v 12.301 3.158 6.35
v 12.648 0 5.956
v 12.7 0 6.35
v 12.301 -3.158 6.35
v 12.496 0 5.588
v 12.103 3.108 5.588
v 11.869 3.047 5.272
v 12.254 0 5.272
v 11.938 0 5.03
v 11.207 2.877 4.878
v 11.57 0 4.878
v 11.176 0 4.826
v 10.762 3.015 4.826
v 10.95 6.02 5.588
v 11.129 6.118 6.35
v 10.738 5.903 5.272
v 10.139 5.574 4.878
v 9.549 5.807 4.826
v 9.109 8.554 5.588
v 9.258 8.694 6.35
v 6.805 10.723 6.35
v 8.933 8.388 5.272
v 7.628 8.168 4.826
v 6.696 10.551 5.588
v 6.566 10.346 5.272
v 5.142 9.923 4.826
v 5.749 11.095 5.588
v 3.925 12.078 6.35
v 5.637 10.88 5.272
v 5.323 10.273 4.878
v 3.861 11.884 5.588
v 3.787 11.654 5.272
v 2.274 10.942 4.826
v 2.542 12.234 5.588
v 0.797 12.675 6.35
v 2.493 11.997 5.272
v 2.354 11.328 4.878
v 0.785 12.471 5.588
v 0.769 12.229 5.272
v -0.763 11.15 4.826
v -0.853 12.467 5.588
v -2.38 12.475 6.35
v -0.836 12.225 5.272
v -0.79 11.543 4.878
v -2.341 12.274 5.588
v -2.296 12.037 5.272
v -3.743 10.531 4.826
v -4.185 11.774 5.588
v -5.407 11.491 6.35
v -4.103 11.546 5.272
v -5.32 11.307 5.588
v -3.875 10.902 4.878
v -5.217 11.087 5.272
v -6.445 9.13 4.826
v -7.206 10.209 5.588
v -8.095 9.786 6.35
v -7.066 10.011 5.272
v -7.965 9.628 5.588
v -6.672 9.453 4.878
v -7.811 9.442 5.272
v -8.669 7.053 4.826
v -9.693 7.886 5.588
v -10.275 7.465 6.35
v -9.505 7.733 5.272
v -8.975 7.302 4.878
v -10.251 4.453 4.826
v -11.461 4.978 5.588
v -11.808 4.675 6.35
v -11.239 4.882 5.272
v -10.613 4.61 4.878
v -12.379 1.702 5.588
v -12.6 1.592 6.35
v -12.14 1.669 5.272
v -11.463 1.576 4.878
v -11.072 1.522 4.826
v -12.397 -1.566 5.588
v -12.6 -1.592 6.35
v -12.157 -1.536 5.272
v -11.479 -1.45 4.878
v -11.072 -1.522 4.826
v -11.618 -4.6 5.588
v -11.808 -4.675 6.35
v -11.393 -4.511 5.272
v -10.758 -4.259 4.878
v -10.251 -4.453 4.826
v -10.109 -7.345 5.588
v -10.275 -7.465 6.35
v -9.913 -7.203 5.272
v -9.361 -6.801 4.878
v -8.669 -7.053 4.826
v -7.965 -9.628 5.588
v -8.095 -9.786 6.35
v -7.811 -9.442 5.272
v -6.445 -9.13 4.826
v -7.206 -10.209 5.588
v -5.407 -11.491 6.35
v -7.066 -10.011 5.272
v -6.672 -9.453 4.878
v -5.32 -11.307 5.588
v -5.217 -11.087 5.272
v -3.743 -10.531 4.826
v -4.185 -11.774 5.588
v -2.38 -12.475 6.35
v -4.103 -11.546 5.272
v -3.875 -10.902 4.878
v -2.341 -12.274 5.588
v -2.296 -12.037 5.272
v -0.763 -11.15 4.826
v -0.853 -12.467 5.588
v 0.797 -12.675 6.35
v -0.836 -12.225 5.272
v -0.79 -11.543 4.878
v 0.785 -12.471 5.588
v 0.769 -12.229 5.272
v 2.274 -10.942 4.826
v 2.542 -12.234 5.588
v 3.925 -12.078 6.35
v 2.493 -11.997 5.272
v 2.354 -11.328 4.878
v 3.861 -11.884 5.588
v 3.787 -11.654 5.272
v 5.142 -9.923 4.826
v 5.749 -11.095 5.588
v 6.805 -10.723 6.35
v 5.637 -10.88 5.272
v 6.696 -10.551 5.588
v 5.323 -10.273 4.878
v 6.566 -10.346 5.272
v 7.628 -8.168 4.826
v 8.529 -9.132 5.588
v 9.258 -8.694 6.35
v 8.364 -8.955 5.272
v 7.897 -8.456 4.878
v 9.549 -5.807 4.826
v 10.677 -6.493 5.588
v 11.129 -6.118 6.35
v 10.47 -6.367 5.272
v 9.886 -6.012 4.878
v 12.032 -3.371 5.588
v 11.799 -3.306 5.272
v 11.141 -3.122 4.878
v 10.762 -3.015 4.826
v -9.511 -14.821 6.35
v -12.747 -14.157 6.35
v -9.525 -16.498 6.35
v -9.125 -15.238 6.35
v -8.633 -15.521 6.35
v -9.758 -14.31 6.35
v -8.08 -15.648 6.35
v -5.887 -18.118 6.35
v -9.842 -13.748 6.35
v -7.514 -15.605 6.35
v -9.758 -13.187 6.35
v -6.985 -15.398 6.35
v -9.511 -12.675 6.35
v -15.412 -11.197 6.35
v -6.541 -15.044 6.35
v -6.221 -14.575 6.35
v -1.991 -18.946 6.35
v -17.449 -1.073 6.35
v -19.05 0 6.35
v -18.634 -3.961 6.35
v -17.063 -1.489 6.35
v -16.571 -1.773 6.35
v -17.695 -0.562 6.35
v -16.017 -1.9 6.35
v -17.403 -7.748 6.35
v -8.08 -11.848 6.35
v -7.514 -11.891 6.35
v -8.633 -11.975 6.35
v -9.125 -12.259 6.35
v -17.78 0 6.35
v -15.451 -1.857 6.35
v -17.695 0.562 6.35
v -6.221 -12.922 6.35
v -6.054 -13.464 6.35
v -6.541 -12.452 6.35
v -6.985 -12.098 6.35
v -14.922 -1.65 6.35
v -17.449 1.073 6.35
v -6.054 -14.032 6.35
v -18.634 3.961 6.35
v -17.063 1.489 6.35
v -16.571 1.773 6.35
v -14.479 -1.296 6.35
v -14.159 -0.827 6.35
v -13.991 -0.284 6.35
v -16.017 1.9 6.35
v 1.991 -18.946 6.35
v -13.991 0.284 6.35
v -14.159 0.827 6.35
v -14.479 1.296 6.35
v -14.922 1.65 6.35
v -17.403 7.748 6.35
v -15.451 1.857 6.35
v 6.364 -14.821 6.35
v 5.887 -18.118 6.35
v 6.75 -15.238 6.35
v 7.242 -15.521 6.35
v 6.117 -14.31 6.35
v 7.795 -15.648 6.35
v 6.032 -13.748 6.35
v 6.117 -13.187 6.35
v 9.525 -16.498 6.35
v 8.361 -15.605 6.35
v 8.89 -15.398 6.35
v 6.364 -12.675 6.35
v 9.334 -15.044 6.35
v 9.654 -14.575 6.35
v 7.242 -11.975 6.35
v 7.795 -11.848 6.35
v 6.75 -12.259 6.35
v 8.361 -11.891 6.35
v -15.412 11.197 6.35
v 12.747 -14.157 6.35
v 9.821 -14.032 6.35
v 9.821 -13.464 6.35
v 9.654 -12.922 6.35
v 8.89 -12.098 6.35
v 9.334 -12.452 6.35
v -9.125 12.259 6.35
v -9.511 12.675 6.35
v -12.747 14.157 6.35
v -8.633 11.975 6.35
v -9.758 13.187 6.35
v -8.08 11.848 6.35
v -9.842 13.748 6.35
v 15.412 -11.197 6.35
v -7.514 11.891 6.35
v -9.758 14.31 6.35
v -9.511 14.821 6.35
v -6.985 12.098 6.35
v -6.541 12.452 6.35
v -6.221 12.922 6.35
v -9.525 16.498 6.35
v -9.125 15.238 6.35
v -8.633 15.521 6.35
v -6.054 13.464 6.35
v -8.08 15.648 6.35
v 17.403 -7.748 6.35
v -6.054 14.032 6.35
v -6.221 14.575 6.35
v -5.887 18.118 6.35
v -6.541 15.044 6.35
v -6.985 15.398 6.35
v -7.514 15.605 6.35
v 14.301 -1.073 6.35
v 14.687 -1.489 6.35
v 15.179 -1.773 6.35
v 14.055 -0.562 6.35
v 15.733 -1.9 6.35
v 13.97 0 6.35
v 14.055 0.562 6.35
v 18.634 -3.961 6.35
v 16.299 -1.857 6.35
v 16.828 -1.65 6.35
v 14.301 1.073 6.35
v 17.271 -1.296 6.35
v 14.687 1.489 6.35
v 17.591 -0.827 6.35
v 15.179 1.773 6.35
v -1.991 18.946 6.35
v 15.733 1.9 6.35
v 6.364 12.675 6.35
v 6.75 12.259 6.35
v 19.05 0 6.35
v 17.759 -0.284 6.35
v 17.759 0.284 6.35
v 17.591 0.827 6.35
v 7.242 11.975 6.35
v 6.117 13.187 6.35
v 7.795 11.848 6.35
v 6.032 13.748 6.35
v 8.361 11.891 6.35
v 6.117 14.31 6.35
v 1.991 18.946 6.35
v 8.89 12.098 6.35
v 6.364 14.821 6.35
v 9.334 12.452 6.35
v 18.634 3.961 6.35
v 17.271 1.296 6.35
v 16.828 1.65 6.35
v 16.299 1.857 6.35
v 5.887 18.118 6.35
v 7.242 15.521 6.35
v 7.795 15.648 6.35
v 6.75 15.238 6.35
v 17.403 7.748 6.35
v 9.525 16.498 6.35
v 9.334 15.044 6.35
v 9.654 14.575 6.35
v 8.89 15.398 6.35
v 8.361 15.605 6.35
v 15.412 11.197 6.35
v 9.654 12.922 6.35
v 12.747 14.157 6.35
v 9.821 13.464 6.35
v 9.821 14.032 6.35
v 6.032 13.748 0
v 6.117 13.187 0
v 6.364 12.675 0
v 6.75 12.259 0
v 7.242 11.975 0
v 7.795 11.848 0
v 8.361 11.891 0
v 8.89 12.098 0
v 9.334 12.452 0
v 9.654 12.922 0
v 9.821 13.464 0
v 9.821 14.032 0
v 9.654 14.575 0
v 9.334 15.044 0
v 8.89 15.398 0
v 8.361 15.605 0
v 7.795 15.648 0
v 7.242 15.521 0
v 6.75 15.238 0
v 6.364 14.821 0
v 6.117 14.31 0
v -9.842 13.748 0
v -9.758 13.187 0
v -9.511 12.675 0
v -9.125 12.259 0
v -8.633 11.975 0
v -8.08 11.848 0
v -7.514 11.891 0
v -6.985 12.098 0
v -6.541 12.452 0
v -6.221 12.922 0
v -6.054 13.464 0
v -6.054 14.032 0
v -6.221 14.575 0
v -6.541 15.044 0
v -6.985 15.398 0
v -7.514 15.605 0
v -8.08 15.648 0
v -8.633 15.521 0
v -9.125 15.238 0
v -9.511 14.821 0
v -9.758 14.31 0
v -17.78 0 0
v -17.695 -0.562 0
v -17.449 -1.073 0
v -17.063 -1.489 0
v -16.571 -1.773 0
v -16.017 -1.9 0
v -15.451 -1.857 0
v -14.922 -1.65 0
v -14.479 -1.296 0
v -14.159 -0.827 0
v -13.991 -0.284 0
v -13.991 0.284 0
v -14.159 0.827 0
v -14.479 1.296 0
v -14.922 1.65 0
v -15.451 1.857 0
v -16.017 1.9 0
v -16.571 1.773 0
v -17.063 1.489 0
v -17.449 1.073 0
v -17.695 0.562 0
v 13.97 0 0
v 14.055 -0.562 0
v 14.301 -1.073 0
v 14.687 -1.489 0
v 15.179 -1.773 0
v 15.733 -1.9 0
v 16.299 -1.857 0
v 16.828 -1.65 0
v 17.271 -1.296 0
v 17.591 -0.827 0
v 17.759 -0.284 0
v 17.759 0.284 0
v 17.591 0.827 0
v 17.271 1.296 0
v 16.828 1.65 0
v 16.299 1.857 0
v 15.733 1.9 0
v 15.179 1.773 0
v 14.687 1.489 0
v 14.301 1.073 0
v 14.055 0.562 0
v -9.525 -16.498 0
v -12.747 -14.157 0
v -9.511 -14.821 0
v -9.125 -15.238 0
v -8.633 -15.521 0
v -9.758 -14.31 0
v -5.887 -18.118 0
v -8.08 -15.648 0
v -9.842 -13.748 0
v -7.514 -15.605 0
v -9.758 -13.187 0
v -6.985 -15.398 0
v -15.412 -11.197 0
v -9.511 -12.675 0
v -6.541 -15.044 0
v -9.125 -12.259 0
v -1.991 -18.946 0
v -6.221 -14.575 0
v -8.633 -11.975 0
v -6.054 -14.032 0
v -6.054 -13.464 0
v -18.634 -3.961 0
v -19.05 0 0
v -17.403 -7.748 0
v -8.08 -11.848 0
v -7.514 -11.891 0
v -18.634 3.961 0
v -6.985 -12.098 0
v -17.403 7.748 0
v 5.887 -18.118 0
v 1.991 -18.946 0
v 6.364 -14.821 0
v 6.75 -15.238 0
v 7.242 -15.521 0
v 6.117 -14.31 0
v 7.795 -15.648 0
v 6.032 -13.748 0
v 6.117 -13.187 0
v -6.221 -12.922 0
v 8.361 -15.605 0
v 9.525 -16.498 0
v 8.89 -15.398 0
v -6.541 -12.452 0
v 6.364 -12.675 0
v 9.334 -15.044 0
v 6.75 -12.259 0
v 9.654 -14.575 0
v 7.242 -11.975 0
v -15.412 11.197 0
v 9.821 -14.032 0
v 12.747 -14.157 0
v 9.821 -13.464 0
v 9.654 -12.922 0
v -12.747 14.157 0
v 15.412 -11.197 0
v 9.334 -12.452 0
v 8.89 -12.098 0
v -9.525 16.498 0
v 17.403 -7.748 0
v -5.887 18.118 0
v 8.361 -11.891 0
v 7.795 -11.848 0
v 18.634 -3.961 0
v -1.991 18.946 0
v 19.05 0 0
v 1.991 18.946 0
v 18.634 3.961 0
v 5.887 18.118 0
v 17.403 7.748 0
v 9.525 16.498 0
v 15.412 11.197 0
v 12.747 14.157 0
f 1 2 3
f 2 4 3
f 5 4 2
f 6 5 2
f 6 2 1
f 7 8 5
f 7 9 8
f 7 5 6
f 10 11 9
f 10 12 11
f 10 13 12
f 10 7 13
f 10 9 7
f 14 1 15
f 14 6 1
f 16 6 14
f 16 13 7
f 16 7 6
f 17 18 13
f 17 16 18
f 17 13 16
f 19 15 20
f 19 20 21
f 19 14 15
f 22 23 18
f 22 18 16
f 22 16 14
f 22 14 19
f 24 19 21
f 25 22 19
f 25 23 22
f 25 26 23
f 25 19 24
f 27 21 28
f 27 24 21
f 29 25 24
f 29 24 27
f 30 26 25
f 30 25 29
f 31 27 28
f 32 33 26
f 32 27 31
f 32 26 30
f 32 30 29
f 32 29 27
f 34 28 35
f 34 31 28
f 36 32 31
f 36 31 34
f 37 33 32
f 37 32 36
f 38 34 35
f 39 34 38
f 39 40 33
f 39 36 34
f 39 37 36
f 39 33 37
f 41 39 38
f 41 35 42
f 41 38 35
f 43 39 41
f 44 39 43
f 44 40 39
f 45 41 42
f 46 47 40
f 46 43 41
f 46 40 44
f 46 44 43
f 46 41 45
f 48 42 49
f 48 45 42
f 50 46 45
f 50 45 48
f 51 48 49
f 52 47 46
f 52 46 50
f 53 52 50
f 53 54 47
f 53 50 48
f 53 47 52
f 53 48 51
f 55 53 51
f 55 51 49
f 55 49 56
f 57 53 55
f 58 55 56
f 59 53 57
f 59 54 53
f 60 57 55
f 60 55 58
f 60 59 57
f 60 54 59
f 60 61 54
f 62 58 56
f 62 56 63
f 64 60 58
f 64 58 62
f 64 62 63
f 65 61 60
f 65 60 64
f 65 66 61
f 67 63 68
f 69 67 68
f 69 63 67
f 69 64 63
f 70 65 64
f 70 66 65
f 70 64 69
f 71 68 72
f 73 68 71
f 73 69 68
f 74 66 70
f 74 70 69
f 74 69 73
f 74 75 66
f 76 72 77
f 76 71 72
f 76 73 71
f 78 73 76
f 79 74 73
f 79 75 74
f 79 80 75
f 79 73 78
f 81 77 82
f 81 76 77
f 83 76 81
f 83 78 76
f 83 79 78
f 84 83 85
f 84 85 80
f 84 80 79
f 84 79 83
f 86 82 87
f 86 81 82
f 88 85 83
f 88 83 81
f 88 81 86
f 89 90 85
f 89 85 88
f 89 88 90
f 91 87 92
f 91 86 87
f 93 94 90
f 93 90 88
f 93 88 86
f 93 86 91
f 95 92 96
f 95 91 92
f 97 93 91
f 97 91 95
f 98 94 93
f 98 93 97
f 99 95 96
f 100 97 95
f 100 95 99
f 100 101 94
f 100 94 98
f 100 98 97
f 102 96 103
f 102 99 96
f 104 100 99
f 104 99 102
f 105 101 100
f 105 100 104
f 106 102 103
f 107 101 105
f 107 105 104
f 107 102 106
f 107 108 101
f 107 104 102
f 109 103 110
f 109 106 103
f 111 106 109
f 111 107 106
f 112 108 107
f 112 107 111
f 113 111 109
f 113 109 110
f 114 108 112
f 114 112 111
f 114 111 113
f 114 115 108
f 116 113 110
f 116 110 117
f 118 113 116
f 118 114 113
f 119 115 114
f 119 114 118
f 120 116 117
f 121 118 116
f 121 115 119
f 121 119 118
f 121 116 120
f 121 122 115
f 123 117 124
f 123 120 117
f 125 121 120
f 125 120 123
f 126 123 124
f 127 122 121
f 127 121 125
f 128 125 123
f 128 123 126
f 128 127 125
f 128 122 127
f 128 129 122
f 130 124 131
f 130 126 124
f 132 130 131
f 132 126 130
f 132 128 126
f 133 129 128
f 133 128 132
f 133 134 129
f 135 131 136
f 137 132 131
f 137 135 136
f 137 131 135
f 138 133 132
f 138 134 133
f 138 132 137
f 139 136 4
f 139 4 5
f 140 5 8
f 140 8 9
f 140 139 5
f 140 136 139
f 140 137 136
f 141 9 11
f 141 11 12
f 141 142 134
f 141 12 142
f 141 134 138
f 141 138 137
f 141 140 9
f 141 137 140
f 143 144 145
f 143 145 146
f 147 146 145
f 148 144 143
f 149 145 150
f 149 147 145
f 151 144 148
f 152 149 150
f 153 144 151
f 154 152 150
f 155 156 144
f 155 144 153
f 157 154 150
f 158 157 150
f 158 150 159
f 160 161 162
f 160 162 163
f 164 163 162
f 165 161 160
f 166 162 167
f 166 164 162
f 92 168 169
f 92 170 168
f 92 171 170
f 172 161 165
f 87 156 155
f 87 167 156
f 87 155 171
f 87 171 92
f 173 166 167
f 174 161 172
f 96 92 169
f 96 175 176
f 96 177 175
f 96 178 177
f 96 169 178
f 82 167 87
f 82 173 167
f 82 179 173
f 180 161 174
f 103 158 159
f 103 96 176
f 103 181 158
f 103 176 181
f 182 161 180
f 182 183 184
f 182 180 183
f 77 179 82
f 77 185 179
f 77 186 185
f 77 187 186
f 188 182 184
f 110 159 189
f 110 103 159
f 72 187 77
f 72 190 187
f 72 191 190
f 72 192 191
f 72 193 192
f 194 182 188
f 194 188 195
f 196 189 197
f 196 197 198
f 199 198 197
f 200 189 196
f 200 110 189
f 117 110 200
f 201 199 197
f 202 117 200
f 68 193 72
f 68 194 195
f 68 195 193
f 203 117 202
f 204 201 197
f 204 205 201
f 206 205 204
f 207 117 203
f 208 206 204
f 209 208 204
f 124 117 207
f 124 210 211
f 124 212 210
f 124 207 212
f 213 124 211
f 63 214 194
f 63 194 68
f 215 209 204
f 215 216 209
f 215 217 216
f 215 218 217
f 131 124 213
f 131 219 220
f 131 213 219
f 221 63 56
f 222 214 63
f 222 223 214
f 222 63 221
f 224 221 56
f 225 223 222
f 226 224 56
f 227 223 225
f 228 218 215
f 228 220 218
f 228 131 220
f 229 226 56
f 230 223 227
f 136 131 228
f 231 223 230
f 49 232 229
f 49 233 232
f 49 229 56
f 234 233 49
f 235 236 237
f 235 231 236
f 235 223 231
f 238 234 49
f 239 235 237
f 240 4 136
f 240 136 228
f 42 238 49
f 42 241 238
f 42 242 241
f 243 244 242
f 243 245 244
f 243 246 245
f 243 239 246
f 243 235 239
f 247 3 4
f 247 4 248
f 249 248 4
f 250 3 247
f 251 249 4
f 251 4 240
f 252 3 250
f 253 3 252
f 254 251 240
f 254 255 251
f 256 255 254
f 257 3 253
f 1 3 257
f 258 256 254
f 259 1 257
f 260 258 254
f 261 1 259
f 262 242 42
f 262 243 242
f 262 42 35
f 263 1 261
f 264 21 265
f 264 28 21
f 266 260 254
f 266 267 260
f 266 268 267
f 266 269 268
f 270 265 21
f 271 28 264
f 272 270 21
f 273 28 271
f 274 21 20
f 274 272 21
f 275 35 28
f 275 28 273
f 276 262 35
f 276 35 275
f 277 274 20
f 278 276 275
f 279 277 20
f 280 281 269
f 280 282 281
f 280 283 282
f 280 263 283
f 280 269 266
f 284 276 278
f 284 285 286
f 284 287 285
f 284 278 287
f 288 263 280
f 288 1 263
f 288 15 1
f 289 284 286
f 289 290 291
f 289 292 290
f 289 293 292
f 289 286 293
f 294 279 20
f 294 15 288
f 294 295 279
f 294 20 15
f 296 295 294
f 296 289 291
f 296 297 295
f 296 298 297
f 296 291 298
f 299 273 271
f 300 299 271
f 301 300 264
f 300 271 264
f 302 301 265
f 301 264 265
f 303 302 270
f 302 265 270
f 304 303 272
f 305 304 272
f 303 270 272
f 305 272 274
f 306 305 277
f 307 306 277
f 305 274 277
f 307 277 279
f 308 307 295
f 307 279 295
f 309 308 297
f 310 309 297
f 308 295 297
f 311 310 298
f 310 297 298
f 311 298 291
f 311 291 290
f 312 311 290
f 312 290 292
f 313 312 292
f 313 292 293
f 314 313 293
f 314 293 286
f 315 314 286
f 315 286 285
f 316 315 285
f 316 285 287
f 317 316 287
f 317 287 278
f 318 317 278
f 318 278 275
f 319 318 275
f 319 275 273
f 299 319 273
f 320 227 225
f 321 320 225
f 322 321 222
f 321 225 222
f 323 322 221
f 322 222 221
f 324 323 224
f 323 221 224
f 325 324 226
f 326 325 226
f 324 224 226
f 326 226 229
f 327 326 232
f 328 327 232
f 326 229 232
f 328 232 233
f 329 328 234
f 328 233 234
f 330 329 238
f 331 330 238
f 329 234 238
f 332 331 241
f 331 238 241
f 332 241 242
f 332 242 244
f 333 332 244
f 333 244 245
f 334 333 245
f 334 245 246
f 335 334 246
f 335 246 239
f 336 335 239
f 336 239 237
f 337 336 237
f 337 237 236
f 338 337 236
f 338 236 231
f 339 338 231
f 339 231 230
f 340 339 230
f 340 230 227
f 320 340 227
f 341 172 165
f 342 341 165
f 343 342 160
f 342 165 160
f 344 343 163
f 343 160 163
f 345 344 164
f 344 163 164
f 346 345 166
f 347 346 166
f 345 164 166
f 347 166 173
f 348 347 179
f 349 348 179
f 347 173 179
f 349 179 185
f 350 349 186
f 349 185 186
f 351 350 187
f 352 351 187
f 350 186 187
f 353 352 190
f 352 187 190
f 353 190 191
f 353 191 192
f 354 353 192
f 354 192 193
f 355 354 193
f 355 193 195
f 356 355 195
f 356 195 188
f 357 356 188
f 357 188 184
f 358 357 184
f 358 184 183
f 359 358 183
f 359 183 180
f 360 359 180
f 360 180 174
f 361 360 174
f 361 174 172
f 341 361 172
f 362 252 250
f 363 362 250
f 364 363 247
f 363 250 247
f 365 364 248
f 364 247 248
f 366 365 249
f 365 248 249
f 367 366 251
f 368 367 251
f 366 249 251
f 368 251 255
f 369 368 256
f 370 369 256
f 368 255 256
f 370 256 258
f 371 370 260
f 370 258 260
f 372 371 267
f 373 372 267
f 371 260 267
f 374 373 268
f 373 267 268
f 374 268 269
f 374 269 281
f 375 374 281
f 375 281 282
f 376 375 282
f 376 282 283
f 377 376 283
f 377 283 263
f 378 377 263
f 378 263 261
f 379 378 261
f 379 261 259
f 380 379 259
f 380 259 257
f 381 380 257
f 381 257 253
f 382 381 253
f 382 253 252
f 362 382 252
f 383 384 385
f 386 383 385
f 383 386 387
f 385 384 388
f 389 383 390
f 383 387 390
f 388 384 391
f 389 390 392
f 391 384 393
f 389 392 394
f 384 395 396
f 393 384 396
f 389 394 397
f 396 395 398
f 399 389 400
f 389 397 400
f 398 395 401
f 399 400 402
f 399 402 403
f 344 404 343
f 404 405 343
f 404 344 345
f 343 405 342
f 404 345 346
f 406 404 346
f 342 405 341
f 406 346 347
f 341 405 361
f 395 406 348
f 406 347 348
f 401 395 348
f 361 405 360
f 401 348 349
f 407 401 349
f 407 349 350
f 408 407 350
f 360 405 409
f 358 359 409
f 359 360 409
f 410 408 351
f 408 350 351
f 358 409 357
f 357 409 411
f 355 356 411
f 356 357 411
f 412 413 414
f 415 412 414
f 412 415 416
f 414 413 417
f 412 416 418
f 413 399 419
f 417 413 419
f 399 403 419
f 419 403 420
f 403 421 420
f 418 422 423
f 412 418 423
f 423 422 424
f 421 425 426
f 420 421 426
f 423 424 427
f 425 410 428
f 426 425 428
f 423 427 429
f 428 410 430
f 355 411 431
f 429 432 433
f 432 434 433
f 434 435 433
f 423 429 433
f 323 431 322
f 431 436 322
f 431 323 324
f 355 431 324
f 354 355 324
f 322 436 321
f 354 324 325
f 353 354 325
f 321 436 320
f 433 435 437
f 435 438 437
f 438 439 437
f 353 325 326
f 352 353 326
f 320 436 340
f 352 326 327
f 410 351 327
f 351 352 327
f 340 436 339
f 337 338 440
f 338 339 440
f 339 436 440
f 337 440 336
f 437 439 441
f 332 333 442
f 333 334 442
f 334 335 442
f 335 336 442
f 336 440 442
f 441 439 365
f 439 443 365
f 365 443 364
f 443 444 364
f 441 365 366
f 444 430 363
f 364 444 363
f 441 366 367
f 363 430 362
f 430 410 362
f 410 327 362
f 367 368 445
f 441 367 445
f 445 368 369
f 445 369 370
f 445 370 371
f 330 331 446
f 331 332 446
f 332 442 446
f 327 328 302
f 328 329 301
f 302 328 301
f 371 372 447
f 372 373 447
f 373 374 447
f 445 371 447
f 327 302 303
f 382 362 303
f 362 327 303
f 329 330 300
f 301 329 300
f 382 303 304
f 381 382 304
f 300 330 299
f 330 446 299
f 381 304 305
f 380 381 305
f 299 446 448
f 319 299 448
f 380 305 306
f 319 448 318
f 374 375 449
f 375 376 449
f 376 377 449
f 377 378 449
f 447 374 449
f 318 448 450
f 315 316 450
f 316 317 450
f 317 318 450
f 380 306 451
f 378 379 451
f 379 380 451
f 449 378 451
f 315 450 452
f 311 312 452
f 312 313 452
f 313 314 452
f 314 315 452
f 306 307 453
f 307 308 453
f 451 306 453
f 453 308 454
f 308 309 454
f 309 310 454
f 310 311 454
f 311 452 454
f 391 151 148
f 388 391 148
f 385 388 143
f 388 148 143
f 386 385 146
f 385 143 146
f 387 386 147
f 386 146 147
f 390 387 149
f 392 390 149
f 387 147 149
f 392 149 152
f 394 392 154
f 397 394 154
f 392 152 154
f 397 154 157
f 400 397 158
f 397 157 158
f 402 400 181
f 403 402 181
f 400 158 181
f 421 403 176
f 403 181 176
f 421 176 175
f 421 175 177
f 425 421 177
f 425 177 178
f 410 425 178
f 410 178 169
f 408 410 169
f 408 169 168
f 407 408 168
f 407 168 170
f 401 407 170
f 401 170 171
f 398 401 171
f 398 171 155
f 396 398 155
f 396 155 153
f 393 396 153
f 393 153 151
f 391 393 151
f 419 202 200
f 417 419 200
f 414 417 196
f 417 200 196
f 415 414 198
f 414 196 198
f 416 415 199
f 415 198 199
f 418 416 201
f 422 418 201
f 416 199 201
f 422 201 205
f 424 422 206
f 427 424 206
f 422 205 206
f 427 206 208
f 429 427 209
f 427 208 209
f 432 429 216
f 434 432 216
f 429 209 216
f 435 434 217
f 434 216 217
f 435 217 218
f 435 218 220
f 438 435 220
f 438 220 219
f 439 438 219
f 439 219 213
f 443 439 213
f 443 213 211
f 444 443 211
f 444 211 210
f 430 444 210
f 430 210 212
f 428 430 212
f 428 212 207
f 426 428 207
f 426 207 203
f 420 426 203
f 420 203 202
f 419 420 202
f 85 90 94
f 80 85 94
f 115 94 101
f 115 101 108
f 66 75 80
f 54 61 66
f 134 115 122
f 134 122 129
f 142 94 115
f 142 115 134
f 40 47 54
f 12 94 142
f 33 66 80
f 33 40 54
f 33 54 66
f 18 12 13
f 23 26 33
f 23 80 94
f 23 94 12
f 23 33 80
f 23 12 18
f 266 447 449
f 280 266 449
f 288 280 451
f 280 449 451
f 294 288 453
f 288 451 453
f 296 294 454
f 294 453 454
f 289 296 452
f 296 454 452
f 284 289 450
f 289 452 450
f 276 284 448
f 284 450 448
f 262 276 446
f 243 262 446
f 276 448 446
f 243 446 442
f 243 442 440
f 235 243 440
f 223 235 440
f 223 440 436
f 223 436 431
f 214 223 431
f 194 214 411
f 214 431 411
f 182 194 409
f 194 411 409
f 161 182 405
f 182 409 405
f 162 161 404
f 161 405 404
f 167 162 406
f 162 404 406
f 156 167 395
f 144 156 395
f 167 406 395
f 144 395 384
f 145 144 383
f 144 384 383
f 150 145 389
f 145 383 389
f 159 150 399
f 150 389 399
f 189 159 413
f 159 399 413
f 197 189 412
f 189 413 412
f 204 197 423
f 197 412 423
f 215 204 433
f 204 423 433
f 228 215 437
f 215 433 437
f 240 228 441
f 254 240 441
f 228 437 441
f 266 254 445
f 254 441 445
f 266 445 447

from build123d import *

# Parameters (mm, degrees)
F0_R     = 19.05
F1_DEPTH = 6.35
F2_D     = 3.81
F3_R     = 12.7
F4_DEPTH = 1.524
F5_R     = 1.52399


# Not quite as in the source:
# - a fillet or chamfer is up to 0.001 mm smaller than in the source, because OpenCascade refuses the exact size


with BuildPart() as f1:
    # F0 (on Top) → F1 (new body)
    with BuildSketch(Plane.XY):
        Circle(F0_R)
    extrude(amount=F1_DEPTH)

    # F2 (through all)
    with Locations(Plane(origin=(0, 0, 0), x_dir=(1, 0, 0), z_dir=(0, 0, -1))):
        with Locations((7.9375, 13.7481532851), (-7.9375, 13.7481532851), (-15.875, 0), (-7.9375, -13.7481532851), (7.9375, -13.7481532851), (15.875, 0)):
            Hole(F2_D / 2)

    # F3 (on face) → F4 (cut)
    with BuildSketch(Plane.XY.offset(6.35)):
        Circle(F3_R)
    extrude(amount=-F4_DEPTH, mode=Mode.SUBTRACT)

    # F5 (radius 1.524 in the source; OpenCascade refuses exactly that, so slightly less here)
    f5_edges = [f1.edges().sort_by_distance(p)[0] for p in [
        (-12.7, 0, 4.826),
    ]]
    fillet(f5_edges, radius=F5_R)


solid = f1.part
